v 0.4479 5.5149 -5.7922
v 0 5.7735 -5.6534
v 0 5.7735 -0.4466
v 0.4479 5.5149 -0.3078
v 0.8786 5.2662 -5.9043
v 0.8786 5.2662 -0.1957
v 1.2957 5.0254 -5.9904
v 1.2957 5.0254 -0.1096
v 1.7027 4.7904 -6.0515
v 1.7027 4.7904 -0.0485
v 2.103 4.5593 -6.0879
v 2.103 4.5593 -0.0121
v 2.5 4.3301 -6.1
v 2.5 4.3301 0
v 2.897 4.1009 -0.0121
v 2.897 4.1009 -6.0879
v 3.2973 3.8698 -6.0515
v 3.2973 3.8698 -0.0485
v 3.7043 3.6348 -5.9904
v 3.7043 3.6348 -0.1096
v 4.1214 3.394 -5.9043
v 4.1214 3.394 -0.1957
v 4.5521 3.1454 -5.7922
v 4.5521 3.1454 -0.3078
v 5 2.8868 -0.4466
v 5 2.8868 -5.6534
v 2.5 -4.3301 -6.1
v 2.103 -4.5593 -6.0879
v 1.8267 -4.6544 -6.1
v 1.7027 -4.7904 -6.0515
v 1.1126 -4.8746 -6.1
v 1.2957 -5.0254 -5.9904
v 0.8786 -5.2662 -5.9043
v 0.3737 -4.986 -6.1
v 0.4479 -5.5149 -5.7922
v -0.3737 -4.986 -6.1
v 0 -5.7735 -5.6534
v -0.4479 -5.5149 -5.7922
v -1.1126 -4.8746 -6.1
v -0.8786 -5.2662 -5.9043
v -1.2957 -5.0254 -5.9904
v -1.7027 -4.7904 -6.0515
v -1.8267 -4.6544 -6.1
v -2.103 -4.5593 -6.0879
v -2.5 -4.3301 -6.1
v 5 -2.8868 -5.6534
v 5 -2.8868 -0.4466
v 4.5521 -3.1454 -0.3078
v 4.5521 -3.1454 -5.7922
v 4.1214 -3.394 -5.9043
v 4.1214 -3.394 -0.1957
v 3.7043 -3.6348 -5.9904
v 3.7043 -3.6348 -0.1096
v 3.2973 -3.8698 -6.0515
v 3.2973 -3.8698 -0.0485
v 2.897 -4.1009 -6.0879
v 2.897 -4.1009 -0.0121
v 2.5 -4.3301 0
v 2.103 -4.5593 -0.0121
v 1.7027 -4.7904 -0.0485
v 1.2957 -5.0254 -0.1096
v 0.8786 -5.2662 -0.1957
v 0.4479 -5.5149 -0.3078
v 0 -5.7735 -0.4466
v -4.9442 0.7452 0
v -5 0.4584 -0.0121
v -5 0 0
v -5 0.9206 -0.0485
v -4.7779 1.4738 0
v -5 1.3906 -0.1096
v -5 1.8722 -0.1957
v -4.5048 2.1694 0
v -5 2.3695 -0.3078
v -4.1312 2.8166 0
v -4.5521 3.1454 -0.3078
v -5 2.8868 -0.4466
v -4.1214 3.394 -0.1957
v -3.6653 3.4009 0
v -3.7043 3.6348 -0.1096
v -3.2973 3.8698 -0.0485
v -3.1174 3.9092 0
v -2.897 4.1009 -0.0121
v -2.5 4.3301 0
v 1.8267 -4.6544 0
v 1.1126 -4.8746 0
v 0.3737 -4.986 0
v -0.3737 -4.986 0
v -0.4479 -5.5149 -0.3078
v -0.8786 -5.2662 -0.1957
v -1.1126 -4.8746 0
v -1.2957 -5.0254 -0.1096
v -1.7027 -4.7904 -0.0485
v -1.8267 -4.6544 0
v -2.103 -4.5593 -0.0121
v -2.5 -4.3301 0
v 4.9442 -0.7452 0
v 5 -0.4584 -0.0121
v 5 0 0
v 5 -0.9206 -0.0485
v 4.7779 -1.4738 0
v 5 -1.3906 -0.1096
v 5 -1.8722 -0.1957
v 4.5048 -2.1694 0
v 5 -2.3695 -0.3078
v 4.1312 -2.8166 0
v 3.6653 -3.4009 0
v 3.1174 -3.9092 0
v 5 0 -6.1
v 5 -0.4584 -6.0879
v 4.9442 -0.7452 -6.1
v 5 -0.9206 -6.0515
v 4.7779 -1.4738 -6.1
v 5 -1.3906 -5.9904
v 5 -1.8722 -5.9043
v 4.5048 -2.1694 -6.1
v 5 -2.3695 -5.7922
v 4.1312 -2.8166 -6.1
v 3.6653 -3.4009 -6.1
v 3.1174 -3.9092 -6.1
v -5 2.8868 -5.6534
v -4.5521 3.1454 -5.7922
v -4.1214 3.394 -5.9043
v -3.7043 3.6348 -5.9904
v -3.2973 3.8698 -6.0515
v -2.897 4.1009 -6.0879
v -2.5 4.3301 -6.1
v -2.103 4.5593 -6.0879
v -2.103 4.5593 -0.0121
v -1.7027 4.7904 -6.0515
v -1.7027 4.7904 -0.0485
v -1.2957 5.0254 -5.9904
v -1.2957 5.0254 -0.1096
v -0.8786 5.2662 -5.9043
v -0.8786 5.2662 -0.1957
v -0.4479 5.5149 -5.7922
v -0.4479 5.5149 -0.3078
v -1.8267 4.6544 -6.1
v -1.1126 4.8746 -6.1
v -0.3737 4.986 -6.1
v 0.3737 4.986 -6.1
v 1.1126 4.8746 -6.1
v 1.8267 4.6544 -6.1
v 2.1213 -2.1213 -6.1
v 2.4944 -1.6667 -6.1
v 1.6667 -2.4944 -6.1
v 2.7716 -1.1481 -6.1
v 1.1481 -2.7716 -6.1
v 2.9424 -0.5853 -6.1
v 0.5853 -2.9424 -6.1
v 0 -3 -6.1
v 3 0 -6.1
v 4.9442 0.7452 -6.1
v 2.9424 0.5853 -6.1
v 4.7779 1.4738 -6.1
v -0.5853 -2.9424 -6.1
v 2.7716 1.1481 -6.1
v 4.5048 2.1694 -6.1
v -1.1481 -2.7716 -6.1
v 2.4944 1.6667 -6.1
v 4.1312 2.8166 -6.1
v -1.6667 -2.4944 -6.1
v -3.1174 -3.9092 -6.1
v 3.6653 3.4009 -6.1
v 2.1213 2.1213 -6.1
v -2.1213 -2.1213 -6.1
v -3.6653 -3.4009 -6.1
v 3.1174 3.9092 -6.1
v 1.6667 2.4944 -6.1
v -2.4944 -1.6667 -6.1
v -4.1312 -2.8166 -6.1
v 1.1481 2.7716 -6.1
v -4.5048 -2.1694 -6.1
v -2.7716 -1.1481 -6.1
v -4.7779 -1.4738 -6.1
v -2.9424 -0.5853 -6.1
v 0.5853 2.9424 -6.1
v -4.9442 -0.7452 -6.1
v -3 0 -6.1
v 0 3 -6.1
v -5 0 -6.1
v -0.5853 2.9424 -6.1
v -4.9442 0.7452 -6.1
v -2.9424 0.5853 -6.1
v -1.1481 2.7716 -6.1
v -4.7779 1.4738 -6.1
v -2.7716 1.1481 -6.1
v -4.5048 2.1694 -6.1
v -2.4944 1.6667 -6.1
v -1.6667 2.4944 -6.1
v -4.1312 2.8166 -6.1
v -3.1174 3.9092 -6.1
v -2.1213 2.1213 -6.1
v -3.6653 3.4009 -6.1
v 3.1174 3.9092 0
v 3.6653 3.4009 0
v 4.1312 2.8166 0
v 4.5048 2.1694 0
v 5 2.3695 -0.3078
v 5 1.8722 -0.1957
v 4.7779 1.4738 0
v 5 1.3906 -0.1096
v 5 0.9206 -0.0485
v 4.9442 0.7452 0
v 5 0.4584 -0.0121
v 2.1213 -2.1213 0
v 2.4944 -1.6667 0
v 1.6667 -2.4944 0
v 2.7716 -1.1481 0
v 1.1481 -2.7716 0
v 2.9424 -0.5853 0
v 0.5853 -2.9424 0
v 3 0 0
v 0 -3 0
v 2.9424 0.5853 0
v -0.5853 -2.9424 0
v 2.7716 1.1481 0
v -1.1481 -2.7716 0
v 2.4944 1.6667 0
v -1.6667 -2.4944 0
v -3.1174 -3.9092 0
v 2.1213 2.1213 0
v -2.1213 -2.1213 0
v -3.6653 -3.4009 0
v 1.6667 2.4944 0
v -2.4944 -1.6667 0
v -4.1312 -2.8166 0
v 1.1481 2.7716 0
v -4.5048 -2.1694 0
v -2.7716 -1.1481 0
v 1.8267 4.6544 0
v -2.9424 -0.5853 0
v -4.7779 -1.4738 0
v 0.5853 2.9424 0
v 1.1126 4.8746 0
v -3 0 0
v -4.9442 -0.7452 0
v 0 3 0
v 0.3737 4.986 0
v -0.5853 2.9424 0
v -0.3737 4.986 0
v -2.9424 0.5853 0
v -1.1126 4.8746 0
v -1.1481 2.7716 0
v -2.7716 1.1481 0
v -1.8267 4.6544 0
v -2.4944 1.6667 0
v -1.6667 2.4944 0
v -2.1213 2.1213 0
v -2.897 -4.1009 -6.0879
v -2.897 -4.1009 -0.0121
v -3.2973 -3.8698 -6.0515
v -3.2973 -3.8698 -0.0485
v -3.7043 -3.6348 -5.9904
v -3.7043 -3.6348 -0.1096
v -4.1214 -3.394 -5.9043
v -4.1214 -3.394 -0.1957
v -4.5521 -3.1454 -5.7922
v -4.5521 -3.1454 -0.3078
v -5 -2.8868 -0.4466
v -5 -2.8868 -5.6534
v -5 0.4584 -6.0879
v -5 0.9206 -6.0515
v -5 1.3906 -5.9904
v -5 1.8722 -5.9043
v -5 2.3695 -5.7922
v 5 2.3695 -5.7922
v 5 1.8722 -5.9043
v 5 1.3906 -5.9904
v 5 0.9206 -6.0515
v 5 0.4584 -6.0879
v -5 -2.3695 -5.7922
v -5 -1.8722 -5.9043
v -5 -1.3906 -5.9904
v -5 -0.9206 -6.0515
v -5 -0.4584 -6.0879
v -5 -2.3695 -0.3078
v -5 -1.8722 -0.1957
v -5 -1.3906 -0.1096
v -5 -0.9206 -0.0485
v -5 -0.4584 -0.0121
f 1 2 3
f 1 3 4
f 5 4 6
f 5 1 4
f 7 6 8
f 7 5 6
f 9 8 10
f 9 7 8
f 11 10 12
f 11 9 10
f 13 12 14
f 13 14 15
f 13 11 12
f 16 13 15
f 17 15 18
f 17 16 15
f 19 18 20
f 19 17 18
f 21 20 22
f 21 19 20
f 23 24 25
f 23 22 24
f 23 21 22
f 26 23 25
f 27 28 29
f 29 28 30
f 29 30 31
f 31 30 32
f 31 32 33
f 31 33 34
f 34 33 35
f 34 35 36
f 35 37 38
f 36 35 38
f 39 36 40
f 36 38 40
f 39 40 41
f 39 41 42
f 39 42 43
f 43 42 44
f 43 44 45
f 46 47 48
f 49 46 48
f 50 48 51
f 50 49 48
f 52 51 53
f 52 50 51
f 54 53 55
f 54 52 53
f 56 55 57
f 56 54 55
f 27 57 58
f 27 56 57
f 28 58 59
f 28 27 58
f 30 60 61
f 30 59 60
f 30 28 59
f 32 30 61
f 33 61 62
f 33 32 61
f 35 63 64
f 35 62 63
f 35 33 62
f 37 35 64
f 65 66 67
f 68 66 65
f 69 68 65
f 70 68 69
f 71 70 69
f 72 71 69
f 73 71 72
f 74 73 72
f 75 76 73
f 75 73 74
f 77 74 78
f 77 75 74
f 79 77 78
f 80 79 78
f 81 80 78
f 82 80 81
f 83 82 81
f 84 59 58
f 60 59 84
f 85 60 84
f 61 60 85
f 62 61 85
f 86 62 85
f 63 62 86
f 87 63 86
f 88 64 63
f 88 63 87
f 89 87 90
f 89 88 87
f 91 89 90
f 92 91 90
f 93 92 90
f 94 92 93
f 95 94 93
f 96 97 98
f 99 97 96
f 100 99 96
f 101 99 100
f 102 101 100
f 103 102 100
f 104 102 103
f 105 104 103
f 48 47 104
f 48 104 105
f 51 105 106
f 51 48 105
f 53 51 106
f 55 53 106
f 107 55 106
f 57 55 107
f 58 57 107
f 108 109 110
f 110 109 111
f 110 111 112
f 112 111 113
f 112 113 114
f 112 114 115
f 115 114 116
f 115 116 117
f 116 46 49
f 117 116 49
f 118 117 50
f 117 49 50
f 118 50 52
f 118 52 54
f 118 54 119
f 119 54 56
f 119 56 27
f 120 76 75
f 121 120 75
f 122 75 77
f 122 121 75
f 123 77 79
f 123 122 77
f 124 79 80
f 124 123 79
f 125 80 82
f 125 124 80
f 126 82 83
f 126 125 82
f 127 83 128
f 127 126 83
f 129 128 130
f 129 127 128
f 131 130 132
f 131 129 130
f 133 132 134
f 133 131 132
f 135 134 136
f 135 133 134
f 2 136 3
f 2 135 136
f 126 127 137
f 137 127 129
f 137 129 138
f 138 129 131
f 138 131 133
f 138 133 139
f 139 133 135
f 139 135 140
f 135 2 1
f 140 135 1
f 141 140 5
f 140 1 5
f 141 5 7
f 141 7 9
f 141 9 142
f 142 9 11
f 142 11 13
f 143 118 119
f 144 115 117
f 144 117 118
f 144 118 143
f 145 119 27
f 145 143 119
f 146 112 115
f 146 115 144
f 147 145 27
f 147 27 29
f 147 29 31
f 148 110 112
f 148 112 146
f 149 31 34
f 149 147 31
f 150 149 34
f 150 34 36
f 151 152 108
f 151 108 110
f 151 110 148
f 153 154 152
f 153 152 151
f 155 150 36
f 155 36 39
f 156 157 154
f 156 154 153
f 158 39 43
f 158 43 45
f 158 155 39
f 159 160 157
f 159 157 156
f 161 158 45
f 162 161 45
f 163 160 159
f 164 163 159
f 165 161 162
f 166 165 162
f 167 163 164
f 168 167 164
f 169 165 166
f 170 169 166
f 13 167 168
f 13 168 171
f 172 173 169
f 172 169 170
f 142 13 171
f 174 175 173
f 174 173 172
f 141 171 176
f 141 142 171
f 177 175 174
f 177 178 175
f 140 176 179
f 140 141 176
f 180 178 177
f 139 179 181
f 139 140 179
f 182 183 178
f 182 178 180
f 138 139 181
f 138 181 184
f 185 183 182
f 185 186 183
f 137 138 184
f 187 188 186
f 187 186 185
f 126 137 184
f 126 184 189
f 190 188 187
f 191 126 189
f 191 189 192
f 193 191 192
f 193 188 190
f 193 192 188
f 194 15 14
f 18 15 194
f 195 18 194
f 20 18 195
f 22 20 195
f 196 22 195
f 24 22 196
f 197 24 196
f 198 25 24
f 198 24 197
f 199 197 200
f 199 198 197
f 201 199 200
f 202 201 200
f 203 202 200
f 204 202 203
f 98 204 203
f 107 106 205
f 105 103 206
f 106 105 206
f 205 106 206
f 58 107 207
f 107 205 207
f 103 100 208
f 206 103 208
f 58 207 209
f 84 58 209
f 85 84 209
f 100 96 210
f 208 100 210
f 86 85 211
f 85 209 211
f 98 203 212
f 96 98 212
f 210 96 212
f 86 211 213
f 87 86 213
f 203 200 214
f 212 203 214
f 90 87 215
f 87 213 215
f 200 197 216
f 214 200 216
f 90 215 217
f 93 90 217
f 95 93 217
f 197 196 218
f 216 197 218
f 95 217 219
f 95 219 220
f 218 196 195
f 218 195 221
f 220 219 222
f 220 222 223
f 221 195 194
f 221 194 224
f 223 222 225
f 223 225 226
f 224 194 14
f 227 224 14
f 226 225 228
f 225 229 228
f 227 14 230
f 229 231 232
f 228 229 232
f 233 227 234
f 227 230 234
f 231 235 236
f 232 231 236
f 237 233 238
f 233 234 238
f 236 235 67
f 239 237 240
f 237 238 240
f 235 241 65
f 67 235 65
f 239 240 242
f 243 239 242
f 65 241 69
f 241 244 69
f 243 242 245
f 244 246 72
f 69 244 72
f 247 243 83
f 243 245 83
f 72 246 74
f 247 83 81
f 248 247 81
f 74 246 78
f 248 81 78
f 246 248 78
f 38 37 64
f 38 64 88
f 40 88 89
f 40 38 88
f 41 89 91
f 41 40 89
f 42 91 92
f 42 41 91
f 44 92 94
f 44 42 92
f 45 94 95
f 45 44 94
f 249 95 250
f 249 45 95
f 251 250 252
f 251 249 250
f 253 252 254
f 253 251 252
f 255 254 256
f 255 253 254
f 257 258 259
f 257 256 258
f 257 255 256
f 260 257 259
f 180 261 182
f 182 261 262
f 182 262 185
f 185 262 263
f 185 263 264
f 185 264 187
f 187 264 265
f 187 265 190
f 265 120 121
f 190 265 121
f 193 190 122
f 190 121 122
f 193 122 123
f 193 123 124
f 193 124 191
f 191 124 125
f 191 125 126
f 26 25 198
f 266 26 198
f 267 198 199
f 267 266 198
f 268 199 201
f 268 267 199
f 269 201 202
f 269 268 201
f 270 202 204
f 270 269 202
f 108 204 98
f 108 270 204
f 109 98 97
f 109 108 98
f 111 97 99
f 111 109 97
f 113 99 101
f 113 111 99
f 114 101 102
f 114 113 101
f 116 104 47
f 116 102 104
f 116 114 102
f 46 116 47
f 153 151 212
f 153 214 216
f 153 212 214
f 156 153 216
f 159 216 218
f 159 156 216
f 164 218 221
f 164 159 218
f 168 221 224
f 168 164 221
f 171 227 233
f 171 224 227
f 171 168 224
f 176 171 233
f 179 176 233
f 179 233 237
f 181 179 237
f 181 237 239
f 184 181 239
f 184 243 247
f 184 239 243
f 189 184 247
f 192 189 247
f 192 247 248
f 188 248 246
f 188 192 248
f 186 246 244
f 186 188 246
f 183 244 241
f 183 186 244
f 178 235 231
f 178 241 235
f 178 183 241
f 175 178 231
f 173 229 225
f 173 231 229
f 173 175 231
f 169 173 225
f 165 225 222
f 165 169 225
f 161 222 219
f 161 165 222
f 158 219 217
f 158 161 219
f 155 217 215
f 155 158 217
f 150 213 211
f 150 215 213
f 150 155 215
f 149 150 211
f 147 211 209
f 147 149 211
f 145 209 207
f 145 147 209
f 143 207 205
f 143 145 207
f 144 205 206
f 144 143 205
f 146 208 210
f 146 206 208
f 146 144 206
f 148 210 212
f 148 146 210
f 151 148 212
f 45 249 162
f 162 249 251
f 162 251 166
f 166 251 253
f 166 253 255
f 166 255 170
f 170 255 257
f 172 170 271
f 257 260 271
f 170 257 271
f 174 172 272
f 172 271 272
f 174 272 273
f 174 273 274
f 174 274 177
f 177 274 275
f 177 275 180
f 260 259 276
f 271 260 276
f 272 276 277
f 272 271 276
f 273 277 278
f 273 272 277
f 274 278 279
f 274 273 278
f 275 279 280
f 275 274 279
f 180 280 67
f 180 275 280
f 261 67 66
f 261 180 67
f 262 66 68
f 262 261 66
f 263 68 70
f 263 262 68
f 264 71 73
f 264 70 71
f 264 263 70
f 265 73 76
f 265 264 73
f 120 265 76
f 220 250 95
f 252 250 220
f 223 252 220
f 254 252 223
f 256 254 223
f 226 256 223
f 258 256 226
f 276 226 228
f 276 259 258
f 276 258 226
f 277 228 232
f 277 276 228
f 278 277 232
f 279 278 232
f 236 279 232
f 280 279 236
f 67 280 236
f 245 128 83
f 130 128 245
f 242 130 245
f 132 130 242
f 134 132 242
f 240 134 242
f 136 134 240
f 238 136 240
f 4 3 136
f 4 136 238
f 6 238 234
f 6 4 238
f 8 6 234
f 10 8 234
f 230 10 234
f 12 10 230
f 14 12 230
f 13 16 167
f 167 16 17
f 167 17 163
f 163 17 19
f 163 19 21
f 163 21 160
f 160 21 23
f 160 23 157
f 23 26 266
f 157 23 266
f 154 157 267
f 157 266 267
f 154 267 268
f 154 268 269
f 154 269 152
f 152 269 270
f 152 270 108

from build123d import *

# Parameters (mm, degrees)
BASENUT_START = -6.1
BASENUTSKE_R  = 3
BASENUT_DEPTH = 6.1


with BuildPart() as part:
    # BaseNutSke → BaseNut (new body)
    with BuildSketch(Plane.XY.offset(BASENUT_START)):
        Polygon((5, 2.886751346), (5, -2.886751346), (0, -5.773502692), (-5, -2.886751346), (-5, 2.886751346), (0, 5.773502692), align=None)
        Circle(BASENUTSKE_R, mode=Mode.SUBTRACT)
    extrude(amount=BASENUT_DEPTH)

    # Sketch3 → Double-Chamfer (revolve, cut)
    with BuildSketch(Plane(origin=(0, 0, 0), x_dir=(0, 0, -1), z_dir=(1, 0, 0))):
        Polygon((6.1, 5), (5.653418013, 5.773502692), (5.653418013, 15.773502692), (16.1, 15.773502692), (16.1, 5), align=None)
        Polygon((0.446581987, 15.773502692), (-10, 15.773502692), (-10, 5), (0, 5), (0.446581987, 5.773502692), align=None)
    revolve(axis=Axis((0, 0, 0), (0, 0, -1)), mode=Mode.SUBTRACT)

    # Sketch5 → EndChamfer (revolve, cut)
    with BuildSketch(Plane(origin=(0, 0, 0), x_dir=(0, 0, -1), z_dir=(1, 0, 0))):
        Polygon((6.0746, 3), (5.689485854, 2.45), (6.1254, 2.45), (6.1254, 3), align=None)
        Polygon((-0.0508, 3), (0, 3), (0.385114146, 2.45), (-0.0508, 2.45), align=None)
    revolve(axis=Axis((0, 0, -25.037505729), (0, 0, -1)), mode=Mode.SUBTRACT)


solid = part.part
